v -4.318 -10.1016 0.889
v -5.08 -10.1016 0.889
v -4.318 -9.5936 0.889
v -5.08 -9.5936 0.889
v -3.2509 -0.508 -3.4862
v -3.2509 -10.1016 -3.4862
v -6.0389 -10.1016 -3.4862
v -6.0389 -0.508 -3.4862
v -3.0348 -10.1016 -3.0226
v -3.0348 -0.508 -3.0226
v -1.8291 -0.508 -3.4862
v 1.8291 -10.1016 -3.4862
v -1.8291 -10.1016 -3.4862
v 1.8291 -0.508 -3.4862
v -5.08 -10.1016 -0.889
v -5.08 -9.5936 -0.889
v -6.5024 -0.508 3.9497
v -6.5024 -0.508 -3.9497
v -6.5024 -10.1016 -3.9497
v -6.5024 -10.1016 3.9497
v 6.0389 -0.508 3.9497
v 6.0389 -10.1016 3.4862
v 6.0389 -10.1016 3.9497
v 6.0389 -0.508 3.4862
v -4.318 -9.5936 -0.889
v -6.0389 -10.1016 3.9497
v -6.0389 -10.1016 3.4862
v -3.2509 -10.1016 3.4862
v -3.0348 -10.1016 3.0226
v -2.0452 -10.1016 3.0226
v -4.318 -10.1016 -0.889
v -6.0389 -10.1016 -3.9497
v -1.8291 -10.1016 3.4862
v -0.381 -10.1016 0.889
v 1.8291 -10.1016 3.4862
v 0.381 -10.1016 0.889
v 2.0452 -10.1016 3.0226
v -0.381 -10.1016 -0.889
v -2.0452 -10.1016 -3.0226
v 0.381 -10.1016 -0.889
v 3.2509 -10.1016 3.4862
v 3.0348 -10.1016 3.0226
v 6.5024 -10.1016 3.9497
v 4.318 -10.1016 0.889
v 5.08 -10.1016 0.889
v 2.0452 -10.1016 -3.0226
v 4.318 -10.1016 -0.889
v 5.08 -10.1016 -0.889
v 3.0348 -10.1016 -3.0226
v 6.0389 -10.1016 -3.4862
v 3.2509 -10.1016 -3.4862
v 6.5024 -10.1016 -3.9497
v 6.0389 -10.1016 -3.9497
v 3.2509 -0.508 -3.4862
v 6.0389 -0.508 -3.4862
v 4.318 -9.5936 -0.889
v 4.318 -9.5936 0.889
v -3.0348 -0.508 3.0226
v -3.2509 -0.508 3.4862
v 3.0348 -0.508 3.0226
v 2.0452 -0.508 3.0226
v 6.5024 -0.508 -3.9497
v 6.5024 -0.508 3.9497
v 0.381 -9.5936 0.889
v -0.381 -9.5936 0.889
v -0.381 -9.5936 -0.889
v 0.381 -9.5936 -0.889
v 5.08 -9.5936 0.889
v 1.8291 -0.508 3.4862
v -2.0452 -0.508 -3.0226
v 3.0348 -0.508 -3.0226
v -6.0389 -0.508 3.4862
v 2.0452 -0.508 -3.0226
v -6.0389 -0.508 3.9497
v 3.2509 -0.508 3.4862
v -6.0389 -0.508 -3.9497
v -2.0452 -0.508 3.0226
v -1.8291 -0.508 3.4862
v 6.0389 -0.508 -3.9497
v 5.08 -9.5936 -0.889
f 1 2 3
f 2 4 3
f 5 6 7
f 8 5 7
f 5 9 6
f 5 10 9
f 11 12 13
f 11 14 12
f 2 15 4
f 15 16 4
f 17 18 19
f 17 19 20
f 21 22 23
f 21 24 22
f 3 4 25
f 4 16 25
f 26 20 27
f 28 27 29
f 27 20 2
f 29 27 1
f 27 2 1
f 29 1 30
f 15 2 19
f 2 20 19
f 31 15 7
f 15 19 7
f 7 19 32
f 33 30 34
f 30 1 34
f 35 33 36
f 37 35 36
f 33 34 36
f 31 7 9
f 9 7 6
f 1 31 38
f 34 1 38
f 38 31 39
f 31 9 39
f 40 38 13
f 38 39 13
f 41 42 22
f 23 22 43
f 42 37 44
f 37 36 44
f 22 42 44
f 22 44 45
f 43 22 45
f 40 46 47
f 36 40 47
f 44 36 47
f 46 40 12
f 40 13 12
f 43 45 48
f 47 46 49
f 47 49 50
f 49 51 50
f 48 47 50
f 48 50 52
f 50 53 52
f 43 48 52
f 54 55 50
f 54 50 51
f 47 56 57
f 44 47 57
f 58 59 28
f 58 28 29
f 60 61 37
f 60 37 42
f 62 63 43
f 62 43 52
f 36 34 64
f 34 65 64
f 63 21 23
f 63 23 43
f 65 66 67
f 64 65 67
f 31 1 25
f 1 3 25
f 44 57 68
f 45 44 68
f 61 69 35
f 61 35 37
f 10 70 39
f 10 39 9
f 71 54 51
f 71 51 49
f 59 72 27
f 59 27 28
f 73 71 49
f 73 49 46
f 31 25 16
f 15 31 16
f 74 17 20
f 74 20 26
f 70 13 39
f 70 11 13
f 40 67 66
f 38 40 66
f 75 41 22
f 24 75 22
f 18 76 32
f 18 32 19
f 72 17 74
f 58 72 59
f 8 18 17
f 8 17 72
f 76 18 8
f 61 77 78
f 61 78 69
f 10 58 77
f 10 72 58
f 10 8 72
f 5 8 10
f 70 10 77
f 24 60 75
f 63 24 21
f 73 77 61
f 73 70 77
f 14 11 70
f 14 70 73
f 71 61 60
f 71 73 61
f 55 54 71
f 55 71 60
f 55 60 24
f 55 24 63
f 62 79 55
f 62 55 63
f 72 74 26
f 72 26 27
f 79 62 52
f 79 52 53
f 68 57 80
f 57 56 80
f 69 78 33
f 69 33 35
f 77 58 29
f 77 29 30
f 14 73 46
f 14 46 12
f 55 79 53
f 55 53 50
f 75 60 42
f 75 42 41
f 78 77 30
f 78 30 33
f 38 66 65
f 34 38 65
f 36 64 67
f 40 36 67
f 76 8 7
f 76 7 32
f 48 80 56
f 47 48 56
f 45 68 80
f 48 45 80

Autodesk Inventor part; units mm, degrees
sketch "Sketch_2" plane through (0, -0.254, 0) normal (0, 1, 0) x (1, 0, 0)
  line L0 (-6.5024, -3.9497) -> (-6.0389, -3.9497)
  line L1 (-6.0389, -3.9497) -> (-6.0389, -3.4862)
  line L2 (-6.0389, -3.4862) -> (-3.2509, -3.4862)
  line L3 (-3.2509, -3.4862) -> (-3.0348, -3.0226)
  line L4 (-3.0348, -3.0226) -> (-2.0452, -3.0226)
  line L5 (-2.0452, -3.0226) -> (-1.8291, -3.4862)
  line L6 (-1.8291, -3.4862) -> (1.8291, -3.4862)
  line L7 (1.8291, -3.4862) -> (2.0452, -3.0226)
  line L8 (2.0452, -3.0226) -> (3.0348, -3.0226)
  line L9 (3.0348, -3.0226) -> (3.2509, -3.4862)
  line L10 (3.2509, -3.4862) -> (6.0389, -3.4862)
  line L11 (6.0389, -3.4862) -> (6.0389, -3.9497)
  line L12 (6.0389, -3.9497) -> (6.5024, -3.9497)
  line L13 (6.5024, -3.9497) -> (6.5024, 3.9497)
  line L14 (6.5024, 3.9497) -> (6.0389, 3.9497)
  line L15 (6.0389, 3.9497) -> (6.0389, 3.4862)
  line L16 (6.0389, 3.4862) -> (3.2509, 3.4862)
  line L17 (3.2509, 3.4862) -> (3.0348, 3.0226)
  line L18 (3.0348, 3.0226) -> (2.0452, 3.0226)
  line L19 (2.0452, 3.0226) -> (1.8291, 3.4862)
  line L20 (1.8291, 3.4862) -> (-1.8291, 3.4862)
  line L21 (-1.8291, 3.4862) -> (-2.0452, 3.0226)
  line L22 (-2.0452, 3.0226) -> (-3.0348, 3.0226)
  line L23 (-3.0348, 3.0226) -> (-3.2509, 3.4862)
  line L24 (-3.2509, 3.4862) -> (-6.0389, 3.4862)
  line L25 (-6.0389, 3.4862) -> (-6.0389, 3.9497)
  line L26 (-6.0389, 3.9497) -> (-6.5024, 3.9497)
  line L27 (-6.5024, 3.9497) -> (-6.5024, -3.9497)
extrude "Extrusion1" add sketch "Sketch_2" against normal blind 9.8476
sketch "Sketch_8" plane through (0, -9.5936, 0) normal (0, 1, 0) x (1, 0, 0)
  line L0 (-5.08, -0.889) -> (-4.318, -0.889)
  line L1 (-4.318, -0.889) -> (-4.318, 0.889)
  line L2 (-4.318, 0.889) -> (-5.08, 0.889)
  line L3 (-5.08, 0.889) -> (-5.08, -0.889)
extrude "Extrusion2" cut sketch "Sketch_8" against normal blind 25.4
sketch "Sketch_5" plane through (0, -9.5936, 0) normal (0, 1, 0) x (1, 0, 0)
  line L0 (-0.381, -0.889) -> (0.381, -0.889)
  line L1 (0.381, -0.889) -> (0.381, 0.889)
  line L2 (0.381, 0.889) -> (-0.381, 0.889)
  line L3 (-0.381, 0.889) -> (-0.381, -0.889)
extrude "Extrusion3" cut sketch "Sketch_5" against normal blind 25.4
sketch "Sketch_9" plane through (0, -9.5936, 0) normal (0, 1, 0) x (1, 0, 0)
  line L0 (4.318, -0.889) -> (5.08, -0.889)
  line L1 (5.08, -0.889) -> (5.08, 0.889)
  line L2 (5.08, 0.889) -> (4.318, 0.889)
  line L3 (4.318, 0.889) -> (4.318, -0.889)
extrude "Extrusion4" cut sketch "Sketch_9" against normal blind 25.4
sketch "Sketch_19" plane through (0, -0.254, 0) normal (0, 1, 0) x (1, 0, 0)
  line L0 (-6.5024, -3.9497) -> (-6.0389, -3.9497)
  line L1 (-6.0389, -3.9497) -> (-6.0389, -3.4862)
  line L2 (-6.0389, -3.4862) -> (-3.2509, -3.4862)
  line L3 (-3.2509, -3.4862) -> (-3.0348, -3.0226)
  line L4 (-3.0348, -3.0226) -> (-2.0452, -3.0226)
  line L5 (-2.0452, -3.0226) -> (-1.8291, -3.4862)
  line L6 (-1.8291, -3.4862) -> (1.8291, -3.4862)
  line L7 (1.8291, -3.4862) -> (2.0452, -3.0226)
  line L8 (2.0452, -3.0226) -> (3.0348, -3.0226)
  line L9 (3.0348, -3.0226) -> (3.2509, -3.4862)
  line L10 (3.2509, -3.4862) -> (6.0389, -3.4862)
  line L11 (6.0389, -3.4862) -> (6.0389, -3.9497)
  line L12 (6.0389, -3.9497) -> (6.5024, -3.9497)
  line L13 (6.5024, -3.9497) -> (6.5024, 3.9497)
  line L14 (6.5024, 3.9497) -> (6.0389, 3.9497)
  line L15 (6.0389, 3.9497) -> (6.0389, 3.4862)
  line L16 (6.0389, 3.4862) -> (3.2509, 3.4862)
  line L17 (3.2509, 3.4862) -> (3.0348, 3.0226)
  line L18 (3.0348, 3.0226) -> (2.0452, 3.0226)
  line L19 (2.0452, 3.0226) -> (1.8291, 3.4862)
  line L20 (1.8291, 3.4862) -> (-1.8291, 3.4862)
  line L21 (-1.8291, 3.4862) -> (-2.0452, 3.0226)
  line L22 (-2.0452, 3.0226) -> (-3.0348, 3.0226)
  line L23 (-3.0348, 3.0226) -> (-3.2509, 3.4862)
  line L24 (-3.2509, 3.4862) -> (-6.0389, 3.4862)
  line L25 (-6.0389, 3.4862) -> (-6.0389, 3.9497)
  line L26 (-6.0389, 3.9497) -> (-6.5024, 3.9497)
  line L27 (-6.5024, 3.9497) -> (-6.5024, -3.9497)
extrude "Extrusion5" cut sketch "Sketch_19" against normal blind 0.254
ref_plane "rot_XY" through (0, 6.6675, 0) normal (0, 0, 1) x (1, 0, 0)
ref_plane "rot_YZ" through (0, 6.6675, 0) normal (1, 0, 0) x (0, 1, 0)
ref_plane "rot_ZX" through (0, 6.6675, 0) normal (0, 1, 0) x (0, 0, 1)
ref_plane "to_cover_XY" through (0, -0.254, 0) normal (0, 1, 0) x (1, 0, 0)
ref_plane "to_cover_YZ" through (0, -0.254, 0) normal (1, 0, 0) x (0, 0, -1)
ref_plane "to_cover_ZX" through (0, -0.254, 0) normal (0, 0, -1) x (0, 1, 0)
ref_plane "to_terminals_XY" through (0, -9.5936, 0) normal (0, -1, 0) x (1, 0, 0)
ref_plane "to_terminals_YZ" through (0, -9.5936, 0) normal (1, 0, 0) x (0, 0, 1)
ref_plane "to_terminals_ZX" through (0, -9.5936, 0) normal (0, 0, 1) x (0, -1, 0)
properties part number "M20_ang1230TX-switch"
